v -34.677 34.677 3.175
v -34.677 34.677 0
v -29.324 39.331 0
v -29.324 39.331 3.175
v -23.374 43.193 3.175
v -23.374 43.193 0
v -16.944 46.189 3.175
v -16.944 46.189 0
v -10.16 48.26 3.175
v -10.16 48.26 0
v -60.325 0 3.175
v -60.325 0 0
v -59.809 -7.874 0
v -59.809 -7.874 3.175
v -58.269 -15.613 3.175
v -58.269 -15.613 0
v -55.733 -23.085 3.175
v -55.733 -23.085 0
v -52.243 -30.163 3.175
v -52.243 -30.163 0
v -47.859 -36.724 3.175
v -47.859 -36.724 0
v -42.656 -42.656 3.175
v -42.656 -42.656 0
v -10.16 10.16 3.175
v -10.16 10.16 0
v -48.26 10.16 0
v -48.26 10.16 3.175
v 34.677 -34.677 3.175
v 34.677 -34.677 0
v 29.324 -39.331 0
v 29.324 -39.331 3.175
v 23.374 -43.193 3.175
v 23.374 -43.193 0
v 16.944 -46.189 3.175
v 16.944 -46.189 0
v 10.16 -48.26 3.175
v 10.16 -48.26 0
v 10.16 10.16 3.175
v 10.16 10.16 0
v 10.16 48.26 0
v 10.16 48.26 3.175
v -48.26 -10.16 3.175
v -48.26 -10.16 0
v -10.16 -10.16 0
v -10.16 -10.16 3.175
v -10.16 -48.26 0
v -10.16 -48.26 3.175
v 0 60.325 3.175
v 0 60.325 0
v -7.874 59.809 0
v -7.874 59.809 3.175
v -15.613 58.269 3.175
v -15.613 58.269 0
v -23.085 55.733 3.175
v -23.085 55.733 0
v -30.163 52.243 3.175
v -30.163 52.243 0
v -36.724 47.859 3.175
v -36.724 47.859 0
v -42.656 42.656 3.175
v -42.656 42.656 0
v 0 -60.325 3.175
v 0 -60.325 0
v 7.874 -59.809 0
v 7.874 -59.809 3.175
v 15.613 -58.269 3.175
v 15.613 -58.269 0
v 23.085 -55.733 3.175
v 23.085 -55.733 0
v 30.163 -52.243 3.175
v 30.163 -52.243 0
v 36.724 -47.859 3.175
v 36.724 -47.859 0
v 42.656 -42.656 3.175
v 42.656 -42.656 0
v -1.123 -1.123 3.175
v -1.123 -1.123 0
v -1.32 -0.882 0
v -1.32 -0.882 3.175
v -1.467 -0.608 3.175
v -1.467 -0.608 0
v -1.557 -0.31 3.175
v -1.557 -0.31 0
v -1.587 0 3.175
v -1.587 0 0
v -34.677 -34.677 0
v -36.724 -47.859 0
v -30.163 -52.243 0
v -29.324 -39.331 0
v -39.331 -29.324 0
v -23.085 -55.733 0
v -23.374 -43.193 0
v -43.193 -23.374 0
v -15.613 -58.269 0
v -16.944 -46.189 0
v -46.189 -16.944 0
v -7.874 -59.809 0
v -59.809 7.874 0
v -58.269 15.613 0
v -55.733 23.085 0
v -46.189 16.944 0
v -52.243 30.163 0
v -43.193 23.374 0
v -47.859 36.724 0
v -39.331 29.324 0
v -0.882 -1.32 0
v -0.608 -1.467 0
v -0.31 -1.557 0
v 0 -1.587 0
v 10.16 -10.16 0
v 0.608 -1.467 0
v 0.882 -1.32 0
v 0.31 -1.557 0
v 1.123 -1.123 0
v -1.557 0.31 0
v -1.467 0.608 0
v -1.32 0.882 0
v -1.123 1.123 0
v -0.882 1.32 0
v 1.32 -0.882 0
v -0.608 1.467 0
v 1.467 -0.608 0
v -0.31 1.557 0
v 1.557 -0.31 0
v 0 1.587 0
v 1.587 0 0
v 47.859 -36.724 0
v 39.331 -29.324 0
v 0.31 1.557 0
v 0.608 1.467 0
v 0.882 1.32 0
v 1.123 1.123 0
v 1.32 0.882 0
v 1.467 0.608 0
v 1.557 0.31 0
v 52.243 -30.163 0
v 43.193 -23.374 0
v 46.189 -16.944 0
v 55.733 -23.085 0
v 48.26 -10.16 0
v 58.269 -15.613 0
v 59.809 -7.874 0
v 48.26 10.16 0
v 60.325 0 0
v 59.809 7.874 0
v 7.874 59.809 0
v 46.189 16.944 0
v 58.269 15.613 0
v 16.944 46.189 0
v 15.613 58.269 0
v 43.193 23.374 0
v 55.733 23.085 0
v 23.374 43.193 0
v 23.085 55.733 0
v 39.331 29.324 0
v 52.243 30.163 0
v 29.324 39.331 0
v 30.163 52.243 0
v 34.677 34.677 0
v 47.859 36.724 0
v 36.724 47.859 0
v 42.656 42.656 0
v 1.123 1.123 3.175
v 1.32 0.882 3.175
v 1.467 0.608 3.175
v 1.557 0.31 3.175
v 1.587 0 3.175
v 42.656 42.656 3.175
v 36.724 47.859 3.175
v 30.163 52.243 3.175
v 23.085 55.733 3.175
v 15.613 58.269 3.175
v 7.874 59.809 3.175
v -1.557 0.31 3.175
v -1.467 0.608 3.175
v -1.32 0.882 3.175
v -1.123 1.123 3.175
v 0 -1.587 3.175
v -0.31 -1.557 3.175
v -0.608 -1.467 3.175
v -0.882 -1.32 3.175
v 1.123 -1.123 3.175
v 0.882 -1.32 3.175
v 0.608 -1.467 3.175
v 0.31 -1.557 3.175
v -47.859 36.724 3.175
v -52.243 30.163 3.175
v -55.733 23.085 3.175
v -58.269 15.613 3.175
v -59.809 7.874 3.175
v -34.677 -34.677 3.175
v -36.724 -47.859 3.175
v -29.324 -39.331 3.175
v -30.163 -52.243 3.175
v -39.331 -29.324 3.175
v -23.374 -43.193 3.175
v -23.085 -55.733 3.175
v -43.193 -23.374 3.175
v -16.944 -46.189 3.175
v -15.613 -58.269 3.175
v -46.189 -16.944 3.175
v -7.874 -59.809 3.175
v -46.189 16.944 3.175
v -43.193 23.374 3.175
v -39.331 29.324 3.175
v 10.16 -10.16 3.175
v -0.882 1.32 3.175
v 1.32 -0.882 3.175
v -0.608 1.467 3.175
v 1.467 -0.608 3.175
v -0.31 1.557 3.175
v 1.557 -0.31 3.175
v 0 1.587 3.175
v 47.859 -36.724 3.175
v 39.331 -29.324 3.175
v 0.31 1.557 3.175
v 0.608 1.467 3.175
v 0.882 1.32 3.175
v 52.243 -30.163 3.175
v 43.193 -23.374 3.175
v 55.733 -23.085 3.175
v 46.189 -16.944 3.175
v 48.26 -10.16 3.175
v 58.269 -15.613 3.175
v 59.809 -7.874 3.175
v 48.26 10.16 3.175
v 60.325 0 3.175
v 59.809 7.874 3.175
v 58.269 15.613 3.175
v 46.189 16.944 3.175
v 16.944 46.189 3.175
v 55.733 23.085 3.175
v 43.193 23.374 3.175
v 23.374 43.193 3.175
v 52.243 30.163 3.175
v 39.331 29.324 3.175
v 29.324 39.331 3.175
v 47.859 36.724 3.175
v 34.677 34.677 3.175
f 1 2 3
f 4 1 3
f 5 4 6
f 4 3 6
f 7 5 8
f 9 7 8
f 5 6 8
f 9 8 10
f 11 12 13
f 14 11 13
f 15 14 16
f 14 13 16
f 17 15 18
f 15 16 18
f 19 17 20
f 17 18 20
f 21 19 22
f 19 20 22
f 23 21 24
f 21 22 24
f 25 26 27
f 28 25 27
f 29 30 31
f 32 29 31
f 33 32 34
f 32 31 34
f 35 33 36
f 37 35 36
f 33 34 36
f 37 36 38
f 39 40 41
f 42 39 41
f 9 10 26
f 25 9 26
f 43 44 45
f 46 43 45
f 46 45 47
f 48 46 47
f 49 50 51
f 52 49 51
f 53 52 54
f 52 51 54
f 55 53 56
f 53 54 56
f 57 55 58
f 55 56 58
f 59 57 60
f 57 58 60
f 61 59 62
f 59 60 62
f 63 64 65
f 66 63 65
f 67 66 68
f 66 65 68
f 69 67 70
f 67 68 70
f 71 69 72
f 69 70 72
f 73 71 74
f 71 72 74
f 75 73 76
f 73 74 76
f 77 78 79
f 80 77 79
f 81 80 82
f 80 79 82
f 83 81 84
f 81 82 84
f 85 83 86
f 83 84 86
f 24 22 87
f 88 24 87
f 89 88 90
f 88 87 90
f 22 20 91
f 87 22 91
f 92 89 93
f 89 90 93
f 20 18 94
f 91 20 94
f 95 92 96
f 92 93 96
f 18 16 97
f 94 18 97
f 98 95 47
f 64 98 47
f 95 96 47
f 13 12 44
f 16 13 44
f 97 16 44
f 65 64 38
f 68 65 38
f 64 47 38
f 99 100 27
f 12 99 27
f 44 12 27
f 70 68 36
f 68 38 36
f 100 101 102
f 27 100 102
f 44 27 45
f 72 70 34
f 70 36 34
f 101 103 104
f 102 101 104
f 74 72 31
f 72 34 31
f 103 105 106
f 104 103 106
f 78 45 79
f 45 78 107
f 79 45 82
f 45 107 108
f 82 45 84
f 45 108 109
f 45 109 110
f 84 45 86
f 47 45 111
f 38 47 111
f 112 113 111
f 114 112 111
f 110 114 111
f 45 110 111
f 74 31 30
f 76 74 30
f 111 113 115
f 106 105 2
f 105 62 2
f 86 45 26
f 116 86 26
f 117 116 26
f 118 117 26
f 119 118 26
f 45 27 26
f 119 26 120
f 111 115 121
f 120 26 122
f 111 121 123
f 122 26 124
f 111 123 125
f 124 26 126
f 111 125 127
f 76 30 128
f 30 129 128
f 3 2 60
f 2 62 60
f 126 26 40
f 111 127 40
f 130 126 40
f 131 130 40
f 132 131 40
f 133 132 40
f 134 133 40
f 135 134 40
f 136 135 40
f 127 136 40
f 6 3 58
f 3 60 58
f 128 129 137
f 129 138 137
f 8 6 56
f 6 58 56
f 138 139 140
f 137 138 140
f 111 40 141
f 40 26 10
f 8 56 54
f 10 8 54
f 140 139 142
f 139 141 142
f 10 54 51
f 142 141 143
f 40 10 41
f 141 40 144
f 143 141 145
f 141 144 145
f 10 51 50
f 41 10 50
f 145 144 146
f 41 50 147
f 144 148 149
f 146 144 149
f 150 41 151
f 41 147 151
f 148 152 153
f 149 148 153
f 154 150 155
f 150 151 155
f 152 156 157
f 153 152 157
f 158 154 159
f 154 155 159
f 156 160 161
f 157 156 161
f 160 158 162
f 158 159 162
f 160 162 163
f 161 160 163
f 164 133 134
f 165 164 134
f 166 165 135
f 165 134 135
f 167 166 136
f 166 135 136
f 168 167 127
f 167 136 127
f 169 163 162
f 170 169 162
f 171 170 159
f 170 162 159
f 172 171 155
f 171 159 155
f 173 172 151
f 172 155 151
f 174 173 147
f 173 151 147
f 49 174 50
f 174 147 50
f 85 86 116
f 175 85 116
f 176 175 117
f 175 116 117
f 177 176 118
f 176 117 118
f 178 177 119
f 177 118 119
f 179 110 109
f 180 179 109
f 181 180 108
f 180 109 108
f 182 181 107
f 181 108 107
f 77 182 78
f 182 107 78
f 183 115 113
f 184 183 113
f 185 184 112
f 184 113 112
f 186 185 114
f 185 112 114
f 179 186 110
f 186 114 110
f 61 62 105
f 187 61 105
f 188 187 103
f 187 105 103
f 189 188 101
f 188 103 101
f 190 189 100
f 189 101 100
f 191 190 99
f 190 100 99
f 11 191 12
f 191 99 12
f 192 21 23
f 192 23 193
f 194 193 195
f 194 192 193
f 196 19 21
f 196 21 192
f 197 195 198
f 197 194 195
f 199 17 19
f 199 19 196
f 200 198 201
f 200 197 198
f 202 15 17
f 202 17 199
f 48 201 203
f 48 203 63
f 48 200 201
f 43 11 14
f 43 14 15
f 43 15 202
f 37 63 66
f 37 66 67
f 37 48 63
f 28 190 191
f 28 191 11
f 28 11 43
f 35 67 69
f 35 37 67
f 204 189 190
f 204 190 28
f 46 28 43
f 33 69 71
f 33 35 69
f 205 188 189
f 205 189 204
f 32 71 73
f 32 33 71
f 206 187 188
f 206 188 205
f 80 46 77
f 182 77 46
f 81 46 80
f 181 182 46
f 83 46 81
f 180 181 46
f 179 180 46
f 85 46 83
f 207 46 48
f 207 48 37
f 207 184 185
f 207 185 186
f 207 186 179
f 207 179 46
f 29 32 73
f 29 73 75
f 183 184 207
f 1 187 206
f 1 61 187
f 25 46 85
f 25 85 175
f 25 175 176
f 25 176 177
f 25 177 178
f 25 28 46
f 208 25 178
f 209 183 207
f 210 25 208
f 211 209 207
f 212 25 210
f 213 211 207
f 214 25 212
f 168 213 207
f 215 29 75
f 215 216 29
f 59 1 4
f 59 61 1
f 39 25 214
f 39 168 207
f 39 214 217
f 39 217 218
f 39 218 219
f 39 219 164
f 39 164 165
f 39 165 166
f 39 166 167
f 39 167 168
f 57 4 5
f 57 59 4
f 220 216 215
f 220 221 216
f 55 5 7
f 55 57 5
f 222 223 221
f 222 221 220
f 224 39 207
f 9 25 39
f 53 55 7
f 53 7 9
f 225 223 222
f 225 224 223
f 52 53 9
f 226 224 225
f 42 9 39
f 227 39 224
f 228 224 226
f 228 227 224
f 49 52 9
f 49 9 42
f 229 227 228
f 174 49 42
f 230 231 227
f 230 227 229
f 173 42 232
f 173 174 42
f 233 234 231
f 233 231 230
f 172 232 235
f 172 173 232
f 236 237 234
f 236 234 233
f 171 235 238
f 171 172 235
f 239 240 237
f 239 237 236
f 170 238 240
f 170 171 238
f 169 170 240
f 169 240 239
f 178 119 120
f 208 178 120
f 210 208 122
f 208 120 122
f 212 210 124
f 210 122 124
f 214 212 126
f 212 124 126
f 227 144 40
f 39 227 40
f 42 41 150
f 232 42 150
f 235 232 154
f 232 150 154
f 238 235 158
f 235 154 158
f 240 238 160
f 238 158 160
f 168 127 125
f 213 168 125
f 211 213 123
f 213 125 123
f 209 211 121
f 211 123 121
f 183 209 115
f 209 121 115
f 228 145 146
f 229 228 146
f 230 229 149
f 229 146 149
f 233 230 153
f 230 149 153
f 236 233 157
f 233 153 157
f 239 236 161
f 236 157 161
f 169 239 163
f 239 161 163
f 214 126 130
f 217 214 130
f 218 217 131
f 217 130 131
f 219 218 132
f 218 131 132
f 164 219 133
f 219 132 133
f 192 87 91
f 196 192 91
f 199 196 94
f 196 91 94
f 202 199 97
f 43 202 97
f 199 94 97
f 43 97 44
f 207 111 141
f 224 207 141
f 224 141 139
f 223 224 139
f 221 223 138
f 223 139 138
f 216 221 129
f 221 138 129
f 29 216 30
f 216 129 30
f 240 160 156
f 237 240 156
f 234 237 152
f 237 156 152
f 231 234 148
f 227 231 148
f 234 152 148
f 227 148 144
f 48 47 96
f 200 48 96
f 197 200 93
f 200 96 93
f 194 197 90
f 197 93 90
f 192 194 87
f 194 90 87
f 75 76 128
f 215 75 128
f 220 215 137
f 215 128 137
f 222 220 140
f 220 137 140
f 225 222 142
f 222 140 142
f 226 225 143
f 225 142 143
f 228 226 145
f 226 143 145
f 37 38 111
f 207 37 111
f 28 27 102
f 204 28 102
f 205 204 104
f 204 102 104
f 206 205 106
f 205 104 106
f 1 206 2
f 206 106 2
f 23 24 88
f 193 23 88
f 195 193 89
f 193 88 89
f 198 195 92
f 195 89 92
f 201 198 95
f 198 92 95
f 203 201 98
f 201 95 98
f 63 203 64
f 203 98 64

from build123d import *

# Parameters (mm, degrees)
F1_DEPTH = 3.175


with BuildPart() as f1:
    # F0 (on Top) → F1 (new body)
    with BuildSketch(Plane.XY):
        with BuildLine():
            Line((34.677494, 34.677494), (42.656217, 42.656217))
            ThreePointArc((42.656217, 42.656217), (23.085378, 55.733033), (0, 60.325))
            Line((0, 60.325), (0, 48.26))
            Line((0, 48.26), (10.16, 48.26))
            ThreePointArc((10.16, 48.26), (23.374034, 43.193116), (34.677494, 34.677494))
        make_face()
        with BuildLine():
            Line((48.26, 0), (60.325, 0))
            ThreePointArc((60.325, 0), (55.733033, 23.085378), (42.656217, 42.656217))
            Line((42.656217, 42.656217), (34.677494, 34.677494))
            ThreePointArc((34.677494, 34.677494), (43.193116, 23.374034), (48.26, 10.16))
            Line((48.26, 10.16), (48.26, 0))
        make_face()
        with BuildLine():
            Line((0, 48.26), (0, 60.325))
            ThreePointArc((0, 60.325), (-23.085378, 55.733033), (-42.656217, 42.656217))
            Line((-42.656217, 42.656217), (-34.677494, 34.677494))
            ThreePointArc((-34.677494, 34.677494), (-23.374034, 43.193116), (-10.16, 48.26))
            Line((-10.16, 48.26), (0, 48.26))
        make_face()
        with BuildLine():
            Line((-34.677494, 34.677494), (-42.656217, 42.656217))
            ThreePointArc((-42.656217, 42.656217), (-55.733033, 23.085378), (-60.325, 0))
            Line((-60.325, 0), (-48.26, 0))
            Line((-48.26, 0), (-48.26, 10.16))
            ThreePointArc((-48.26, 10.16), (-43.193116, 23.374034), (-34.677494, 34.677494))
        make_face()
        with BuildLine():
            Line((0, 17.78), (0, 48.26))
            Line((0, 48.26), (-10.16, 48.26))
            Line((-10.16, 48.26), (-10.16, 14.591189))
            ThreePointArc((-10.16, 14.591189), (-5.324334, 16.964076), (0, 17.78))
        make_face()
        with BuildLine():
            Line((10.16, 48.26), (0, 48.26))
            Line((0, 48.26), (0, 17.78))
            ThreePointArc((0, 17.78), (5.324334, 16.964076), (10.16, 14.591189))
            Line((10.16, 14.591189), (10.16, 48.26))
        make_face()
        with BuildLine():
            ThreePointArc((10.16, 14.591189), (5.324334, 16.964076), (0, 17.78))
            Line((0, 17.78), (0, 10.16))
            Line((0, 10.16), (10.16, 10.16))
            Line((10.16, 10.16), (10.16, 14.591189))
        make_face()
        with BuildLine():
            Line((0, 10.16), (0, 17.78))
            ThreePointArc((0, 17.78), (-5.324334, 16.964076), (-10.16, 14.591189))
            Line((-10.16, 14.591189), (-10.16, 10.16))
            Line((-10.16, 10.16), (0, 10.16))
        make_face()
        with BuildLine():
            Line((0, 1.5875), (0, 10.16))
            Line((0, 10.16), (-10.16, 10.16))
            Line((-10.16, 10.16), (-1.122532, 1.122532))
            ThreePointArc((-1.122532, 1.122532), (-0.60751, 1.466659), (0, 1.5875))
        make_face()
        with BuildLine():
            Line((-1.122532, 1.122532), (-10.16, 10.16))
            Line((-10.16, 10.16), (-10.16, 0))
            Line((-10.16, 0), (-1.5875, 0))
            ThreePointArc((-1.5875, 0), (-1.466659, 0.60751), (-1.122532, 1.122532))
        make_face()
        with BuildLine():
            ThreePointArc((-14.591189, 10.16), (-16.964076, 5.324334), (-17.78, 0))
            Line((-17.78, 0), (-10.16, 0))
            Line((-10.16, 0), (-10.16, 10.16))
            Line((-10.16, 10.16), (-14.591189, 10.16))
        make_face()
        with BuildLine():
            Line((10.16, 0), (17.78, 0))
            ThreePointArc((17.78, 0), (16.964076, 5.324334), (14.591189, 10.16))
            Line((14.591189, 10.16), (10.16, 10.16))
            Line((10.16, 10.16), (10.16, 0))
        make_face()
        with BuildLine():
            Line((1.122532, 1.122532), (10.16, 10.16))
            Line((10.16, 10.16), (0, 10.16))
            Line((0, 10.16), (0, 1.5875))
            ThreePointArc((0, 1.5875), (0.60751, 1.466659), (1.122532, 1.122532))
        make_face()
        with BuildLine():
            Line((1.5875, 0), (10.16, 0))
            Line((10.16, 0), (10.16, 10.16))
            Line((10.16, 10.16), (1.122532, 1.122532))
            ThreePointArc((1.122532, 1.122532), (1.466659, 0.60751), (1.5875, 0))
        make_face()
        with BuildLine():
            Line((-10.16, 0), (-17.78, 0))
            ThreePointArc((-17.78, 0), (-16.964076, -5.324334), (-14.591189, -10.16))
            Line((-14.591189, -10.16), (-10.16, -10.16))
            Line((-10.16, -10.16), (-10.16, 0))
        make_face()
        with BuildLine():
            Line((-10.16, -10.16), (0, -10.16))
            Line((0, -10.16), (0, -1.5875))
            ThreePointArc((0, -1.5875), (-0.60751, -1.466659), (-1.122532, -1.122532))
            Line((-1.122532, -1.122532), (-10.16, -10.16))
        make_face()
        with BuildLine():
            ThreePointArc((-10.16, -14.591189), (-5.324334, -16.964076), (0, -17.78))
            Line((0, -17.78), (0, -10.16))
            Line((0, -10.16), (-10.16, -10.16))
            Line((-10.16, -10.16), (-10.16, -14.591189))
        make_face()
        with BuildLine():
            Line((0, -10.16), (0, -17.78))
            ThreePointArc((0, -17.78), (5.324334, -16.964076), (10.16, -14.591189))
            Line((10.16, -14.591189), (10.16, -10.16))
            Line((10.16, -10.16), (0, -10.16))
        make_face()
        with BuildLine():
            Line((0, -10.16), (10.16, -10.16))
            Line((10.16, -10.16), (1.122532, -1.122532))
            ThreePointArc((1.122532, -1.122532), (0.60751, -1.466659), (0, -1.5875))
            Line((0, -1.5875), (0, -10.16))
        make_face()
        with BuildLine():
            ThreePointArc((14.591189, -10.16), (16.964076, -5.324334), (17.78, 0))
            Line((17.78, 0), (10.16, 0))
            Line((10.16, 0), (10.16, -10.16))
            Line((10.16, -10.16), (14.591189, -10.16))
        make_face()
        with BuildLine():
            Line((17.78, 0), (48.26, 0))
            Line((48.26, 0), (48.26, 10.16))
            Line((48.26, 10.16), (14.591189, 10.16))
            ThreePointArc((14.591189, 10.16), (16.964076, 5.324334), (17.78, 0))
        make_face()
        with BuildLine():
            Line((48.26, -10.16), (48.26, 0))
            Line((48.26, 0), (17.78, 0))
            ThreePointArc((17.78, 0), (16.964076, -5.324334), (14.591189, -10.16))
            Line((14.591189, -10.16), (48.26, -10.16))
        make_face()
        with BuildLine():
            Line((-48.26, 10.16), (-48.26, 0))
            Line((-48.26, 0), (-17.78, 0))
            ThreePointArc((-17.78, 0), (-16.964076, 5.324334), (-14.591189, 10.16))
            Line((-14.591189, 10.16), (-48.26, 10.16))
        make_face()
        with BuildLine():
            Line((-17.78, 0), (-48.26, 0))
            Line((-48.26, 0), (-48.26, -10.16))
            Line((-48.26, -10.16), (-14.591189, -10.16))
            ThreePointArc((-14.591189, -10.16), (-16.964076, -5.324334), (-17.78, 0))
        make_face()
        with BuildLine():
            Line((-10.16, -48.26), (0, -48.26))
            Line((0, -48.26), (0, -17.78))
            ThreePointArc((0, -17.78), (-5.324334, -16.964076), (-10.16, -14.591189))
            Line((-10.16, -14.591189), (-10.16, -48.26))
        make_face()
        with BuildLine():
            Line((0, -17.78), (0, -48.26))
            Line((0, -48.26), (10.16, -48.26))
            Line((10.16, -48.26), (10.16, -14.591189))
            ThreePointArc((10.16, -14.591189), (5.324334, -16.964076), (0, -17.78))
        make_face()
        with BuildLine():
            ThreePointArc((42.656217, -42.656217), (55.733033, -23.085378), (60.325, 0))
            Line((60.325, 0), (48.26, 0))
            Line((48.26, 0), (48.26, -10.16))
            ThreePointArc((48.26, -10.16), (43.193116, -23.374034), (34.677494, -34.677494))
            Line((34.677494, -34.677494), (42.656217, -42.656217))
        make_face()
        with BuildLine():
            ThreePointArc((0, -60.325), (23.085378, -55.733033), (42.656217, -42.656217))
            Line((42.656217, -42.656217), (34.677494, -34.677494))
            ThreePointArc((34.677494, -34.677494), (23.374034, -43.193116), (10.16, -48.26))
            Line((10.16, -48.26), (0, -48.26))
            Line((0, -48.26), (0, -60.325))
        make_face()
        with BuildLine():
            ThreePointArc((-42.656217, -42.656217), (-23.085378, -55.733033), (0, -60.325))
            Line((0, -60.325), (0, -48.26))
            Line((0, -48.26), (-10.16, -48.26))
            ThreePointArc((-10.16, -48.26), (-23.374034, -43.193116), (-34.677494, -34.677494))
            Line((-34.677494, -34.677494), (-42.656217, -42.656217))
        make_face()
        with BuildLine():
            ThreePointArc((-60.325, 0), (-55.733033, -23.085378), (-42.656217, -42.656217))
            Line((-42.656217, -42.656217), (-34.677494, -34.677494))
            ThreePointArc((-34.677494, -34.677494), (-43.193116, -23.374034), (-48.26, -10.16))
            Line((-48.26, -10.16), (-48.26, 0))
            Line((-48.26, 0), (-60.325, 0))
        make_face()
        with BuildLine():
            Line((10.16, -10.16), (10.16, 0))
            Line((10.16, 0), (1.5875, 0))
            ThreePointArc((1.5875, 0), (1.466659, -0.60751), (1.122532, -1.122532))
            Line((1.122532, -1.122532), (10.16, -10.16))
        make_face()
        with BuildLine():
            Line((-10.16, 0), (-10.16, -10.16))
            Line((-10.16, -10.16), (-1.122532, -1.122532))
            ThreePointArc((-1.122532, -1.122532), (-1.466659, -0.60751), (-1.5875, 0))
            Line((-1.5875, 0), (-10.16, 0))
        make_face()
    extrude(amount=F1_DEPTH)


solid = f1.part
